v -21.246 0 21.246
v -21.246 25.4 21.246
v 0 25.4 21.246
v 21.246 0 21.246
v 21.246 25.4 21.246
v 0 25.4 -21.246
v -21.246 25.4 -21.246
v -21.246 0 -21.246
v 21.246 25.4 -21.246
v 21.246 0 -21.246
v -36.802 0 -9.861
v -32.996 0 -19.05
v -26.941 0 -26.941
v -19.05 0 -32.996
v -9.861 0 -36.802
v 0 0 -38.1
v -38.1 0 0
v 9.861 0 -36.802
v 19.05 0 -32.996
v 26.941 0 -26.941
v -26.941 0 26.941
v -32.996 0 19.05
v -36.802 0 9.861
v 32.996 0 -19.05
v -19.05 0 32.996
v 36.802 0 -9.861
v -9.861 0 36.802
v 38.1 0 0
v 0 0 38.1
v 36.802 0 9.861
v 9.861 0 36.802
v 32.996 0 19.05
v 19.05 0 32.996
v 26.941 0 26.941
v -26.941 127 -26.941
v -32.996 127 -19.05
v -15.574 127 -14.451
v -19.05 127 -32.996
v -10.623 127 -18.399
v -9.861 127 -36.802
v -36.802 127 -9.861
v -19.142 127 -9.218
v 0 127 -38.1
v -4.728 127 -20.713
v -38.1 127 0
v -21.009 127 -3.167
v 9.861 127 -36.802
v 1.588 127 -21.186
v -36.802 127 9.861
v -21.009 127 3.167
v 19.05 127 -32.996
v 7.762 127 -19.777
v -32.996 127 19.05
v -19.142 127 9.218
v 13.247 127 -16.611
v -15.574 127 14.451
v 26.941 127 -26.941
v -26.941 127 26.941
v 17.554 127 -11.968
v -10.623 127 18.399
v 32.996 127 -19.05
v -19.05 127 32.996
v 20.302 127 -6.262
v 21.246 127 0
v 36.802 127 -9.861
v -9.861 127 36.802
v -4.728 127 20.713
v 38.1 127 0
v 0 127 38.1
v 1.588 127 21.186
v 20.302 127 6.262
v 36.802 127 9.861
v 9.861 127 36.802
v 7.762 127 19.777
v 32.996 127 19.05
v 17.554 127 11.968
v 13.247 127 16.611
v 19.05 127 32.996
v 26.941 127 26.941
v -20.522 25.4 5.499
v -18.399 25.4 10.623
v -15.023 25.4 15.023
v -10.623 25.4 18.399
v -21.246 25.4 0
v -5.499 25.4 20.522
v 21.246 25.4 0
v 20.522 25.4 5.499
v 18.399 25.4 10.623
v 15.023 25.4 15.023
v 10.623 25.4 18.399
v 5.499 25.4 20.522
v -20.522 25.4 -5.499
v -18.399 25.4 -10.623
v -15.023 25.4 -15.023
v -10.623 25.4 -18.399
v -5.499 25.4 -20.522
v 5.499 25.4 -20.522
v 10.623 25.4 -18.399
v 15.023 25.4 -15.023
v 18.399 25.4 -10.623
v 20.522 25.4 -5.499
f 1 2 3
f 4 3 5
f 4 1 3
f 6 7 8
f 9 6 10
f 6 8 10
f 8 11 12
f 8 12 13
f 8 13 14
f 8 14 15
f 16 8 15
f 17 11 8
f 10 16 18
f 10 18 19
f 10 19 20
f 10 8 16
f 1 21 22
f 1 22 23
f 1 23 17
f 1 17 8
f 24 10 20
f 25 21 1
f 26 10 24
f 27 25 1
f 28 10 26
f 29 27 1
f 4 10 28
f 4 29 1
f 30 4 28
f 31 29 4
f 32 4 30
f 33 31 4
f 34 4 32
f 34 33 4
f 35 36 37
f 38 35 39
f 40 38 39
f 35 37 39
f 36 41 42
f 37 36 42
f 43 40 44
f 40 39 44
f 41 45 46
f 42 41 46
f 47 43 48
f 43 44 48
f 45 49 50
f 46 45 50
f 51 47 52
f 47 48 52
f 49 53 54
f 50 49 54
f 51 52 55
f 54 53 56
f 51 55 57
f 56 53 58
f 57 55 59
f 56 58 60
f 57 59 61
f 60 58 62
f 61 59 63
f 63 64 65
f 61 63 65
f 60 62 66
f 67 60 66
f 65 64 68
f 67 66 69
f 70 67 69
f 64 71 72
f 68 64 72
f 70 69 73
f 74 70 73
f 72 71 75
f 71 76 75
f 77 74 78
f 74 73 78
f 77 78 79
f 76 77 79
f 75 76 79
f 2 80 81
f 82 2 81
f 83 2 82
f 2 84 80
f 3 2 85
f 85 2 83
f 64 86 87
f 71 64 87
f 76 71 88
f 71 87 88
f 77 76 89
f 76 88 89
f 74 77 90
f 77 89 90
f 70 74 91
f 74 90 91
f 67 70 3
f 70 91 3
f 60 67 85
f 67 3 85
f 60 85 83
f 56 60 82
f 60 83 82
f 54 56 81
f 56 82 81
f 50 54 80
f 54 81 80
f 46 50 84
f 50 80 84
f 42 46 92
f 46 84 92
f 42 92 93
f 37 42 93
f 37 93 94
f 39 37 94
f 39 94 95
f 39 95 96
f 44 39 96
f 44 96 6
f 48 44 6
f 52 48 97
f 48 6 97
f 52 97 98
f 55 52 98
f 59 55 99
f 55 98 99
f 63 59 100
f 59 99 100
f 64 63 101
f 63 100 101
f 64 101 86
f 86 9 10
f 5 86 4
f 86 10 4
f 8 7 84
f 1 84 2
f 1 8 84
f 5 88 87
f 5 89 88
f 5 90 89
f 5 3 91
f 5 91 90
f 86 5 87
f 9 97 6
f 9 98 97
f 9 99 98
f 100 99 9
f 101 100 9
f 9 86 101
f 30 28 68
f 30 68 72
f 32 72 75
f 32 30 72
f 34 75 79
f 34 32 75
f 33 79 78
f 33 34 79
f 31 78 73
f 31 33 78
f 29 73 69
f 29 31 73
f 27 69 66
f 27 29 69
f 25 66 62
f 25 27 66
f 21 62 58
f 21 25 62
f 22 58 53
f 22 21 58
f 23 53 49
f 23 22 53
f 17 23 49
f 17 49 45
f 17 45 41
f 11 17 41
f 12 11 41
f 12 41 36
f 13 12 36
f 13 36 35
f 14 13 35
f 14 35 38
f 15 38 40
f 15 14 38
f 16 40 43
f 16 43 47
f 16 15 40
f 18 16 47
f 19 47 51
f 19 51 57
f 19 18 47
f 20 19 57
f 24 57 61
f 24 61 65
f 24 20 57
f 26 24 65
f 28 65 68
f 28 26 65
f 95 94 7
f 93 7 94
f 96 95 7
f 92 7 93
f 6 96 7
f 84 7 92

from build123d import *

# Parameters (mm, degrees)
F0_R     = 38.1
F3_DEPTH = 127
F2_R     = 21.245809
F4_DEPTH = 127.001
F1_W     = 42.491618
F1_H     = 42.491618
F5_DEPTH = 25.4


with BuildPart() as f3:
    # F0 (on Front) → F3 (new body)
    with BuildSketch(Plane.XZ):
        Circle(F0_R)
    extrude(amount=-F3_DEPTH)

    # F2 (on Front) → F4 (cut, through all)
    with BuildSketch(Plane.XZ):
        Circle(F2_R)
    extrude(amount=-F4_DEPTH, mode=Mode.SUBTRACT)

    # F1 (on Front) → F5 (cut)
    with BuildSketch(Plane.XZ):
        Rectangle(F1_W, F1_H)
    extrude(amount=-F5_DEPTH, mode=Mode.SUBTRACT)


solid = f3.part
